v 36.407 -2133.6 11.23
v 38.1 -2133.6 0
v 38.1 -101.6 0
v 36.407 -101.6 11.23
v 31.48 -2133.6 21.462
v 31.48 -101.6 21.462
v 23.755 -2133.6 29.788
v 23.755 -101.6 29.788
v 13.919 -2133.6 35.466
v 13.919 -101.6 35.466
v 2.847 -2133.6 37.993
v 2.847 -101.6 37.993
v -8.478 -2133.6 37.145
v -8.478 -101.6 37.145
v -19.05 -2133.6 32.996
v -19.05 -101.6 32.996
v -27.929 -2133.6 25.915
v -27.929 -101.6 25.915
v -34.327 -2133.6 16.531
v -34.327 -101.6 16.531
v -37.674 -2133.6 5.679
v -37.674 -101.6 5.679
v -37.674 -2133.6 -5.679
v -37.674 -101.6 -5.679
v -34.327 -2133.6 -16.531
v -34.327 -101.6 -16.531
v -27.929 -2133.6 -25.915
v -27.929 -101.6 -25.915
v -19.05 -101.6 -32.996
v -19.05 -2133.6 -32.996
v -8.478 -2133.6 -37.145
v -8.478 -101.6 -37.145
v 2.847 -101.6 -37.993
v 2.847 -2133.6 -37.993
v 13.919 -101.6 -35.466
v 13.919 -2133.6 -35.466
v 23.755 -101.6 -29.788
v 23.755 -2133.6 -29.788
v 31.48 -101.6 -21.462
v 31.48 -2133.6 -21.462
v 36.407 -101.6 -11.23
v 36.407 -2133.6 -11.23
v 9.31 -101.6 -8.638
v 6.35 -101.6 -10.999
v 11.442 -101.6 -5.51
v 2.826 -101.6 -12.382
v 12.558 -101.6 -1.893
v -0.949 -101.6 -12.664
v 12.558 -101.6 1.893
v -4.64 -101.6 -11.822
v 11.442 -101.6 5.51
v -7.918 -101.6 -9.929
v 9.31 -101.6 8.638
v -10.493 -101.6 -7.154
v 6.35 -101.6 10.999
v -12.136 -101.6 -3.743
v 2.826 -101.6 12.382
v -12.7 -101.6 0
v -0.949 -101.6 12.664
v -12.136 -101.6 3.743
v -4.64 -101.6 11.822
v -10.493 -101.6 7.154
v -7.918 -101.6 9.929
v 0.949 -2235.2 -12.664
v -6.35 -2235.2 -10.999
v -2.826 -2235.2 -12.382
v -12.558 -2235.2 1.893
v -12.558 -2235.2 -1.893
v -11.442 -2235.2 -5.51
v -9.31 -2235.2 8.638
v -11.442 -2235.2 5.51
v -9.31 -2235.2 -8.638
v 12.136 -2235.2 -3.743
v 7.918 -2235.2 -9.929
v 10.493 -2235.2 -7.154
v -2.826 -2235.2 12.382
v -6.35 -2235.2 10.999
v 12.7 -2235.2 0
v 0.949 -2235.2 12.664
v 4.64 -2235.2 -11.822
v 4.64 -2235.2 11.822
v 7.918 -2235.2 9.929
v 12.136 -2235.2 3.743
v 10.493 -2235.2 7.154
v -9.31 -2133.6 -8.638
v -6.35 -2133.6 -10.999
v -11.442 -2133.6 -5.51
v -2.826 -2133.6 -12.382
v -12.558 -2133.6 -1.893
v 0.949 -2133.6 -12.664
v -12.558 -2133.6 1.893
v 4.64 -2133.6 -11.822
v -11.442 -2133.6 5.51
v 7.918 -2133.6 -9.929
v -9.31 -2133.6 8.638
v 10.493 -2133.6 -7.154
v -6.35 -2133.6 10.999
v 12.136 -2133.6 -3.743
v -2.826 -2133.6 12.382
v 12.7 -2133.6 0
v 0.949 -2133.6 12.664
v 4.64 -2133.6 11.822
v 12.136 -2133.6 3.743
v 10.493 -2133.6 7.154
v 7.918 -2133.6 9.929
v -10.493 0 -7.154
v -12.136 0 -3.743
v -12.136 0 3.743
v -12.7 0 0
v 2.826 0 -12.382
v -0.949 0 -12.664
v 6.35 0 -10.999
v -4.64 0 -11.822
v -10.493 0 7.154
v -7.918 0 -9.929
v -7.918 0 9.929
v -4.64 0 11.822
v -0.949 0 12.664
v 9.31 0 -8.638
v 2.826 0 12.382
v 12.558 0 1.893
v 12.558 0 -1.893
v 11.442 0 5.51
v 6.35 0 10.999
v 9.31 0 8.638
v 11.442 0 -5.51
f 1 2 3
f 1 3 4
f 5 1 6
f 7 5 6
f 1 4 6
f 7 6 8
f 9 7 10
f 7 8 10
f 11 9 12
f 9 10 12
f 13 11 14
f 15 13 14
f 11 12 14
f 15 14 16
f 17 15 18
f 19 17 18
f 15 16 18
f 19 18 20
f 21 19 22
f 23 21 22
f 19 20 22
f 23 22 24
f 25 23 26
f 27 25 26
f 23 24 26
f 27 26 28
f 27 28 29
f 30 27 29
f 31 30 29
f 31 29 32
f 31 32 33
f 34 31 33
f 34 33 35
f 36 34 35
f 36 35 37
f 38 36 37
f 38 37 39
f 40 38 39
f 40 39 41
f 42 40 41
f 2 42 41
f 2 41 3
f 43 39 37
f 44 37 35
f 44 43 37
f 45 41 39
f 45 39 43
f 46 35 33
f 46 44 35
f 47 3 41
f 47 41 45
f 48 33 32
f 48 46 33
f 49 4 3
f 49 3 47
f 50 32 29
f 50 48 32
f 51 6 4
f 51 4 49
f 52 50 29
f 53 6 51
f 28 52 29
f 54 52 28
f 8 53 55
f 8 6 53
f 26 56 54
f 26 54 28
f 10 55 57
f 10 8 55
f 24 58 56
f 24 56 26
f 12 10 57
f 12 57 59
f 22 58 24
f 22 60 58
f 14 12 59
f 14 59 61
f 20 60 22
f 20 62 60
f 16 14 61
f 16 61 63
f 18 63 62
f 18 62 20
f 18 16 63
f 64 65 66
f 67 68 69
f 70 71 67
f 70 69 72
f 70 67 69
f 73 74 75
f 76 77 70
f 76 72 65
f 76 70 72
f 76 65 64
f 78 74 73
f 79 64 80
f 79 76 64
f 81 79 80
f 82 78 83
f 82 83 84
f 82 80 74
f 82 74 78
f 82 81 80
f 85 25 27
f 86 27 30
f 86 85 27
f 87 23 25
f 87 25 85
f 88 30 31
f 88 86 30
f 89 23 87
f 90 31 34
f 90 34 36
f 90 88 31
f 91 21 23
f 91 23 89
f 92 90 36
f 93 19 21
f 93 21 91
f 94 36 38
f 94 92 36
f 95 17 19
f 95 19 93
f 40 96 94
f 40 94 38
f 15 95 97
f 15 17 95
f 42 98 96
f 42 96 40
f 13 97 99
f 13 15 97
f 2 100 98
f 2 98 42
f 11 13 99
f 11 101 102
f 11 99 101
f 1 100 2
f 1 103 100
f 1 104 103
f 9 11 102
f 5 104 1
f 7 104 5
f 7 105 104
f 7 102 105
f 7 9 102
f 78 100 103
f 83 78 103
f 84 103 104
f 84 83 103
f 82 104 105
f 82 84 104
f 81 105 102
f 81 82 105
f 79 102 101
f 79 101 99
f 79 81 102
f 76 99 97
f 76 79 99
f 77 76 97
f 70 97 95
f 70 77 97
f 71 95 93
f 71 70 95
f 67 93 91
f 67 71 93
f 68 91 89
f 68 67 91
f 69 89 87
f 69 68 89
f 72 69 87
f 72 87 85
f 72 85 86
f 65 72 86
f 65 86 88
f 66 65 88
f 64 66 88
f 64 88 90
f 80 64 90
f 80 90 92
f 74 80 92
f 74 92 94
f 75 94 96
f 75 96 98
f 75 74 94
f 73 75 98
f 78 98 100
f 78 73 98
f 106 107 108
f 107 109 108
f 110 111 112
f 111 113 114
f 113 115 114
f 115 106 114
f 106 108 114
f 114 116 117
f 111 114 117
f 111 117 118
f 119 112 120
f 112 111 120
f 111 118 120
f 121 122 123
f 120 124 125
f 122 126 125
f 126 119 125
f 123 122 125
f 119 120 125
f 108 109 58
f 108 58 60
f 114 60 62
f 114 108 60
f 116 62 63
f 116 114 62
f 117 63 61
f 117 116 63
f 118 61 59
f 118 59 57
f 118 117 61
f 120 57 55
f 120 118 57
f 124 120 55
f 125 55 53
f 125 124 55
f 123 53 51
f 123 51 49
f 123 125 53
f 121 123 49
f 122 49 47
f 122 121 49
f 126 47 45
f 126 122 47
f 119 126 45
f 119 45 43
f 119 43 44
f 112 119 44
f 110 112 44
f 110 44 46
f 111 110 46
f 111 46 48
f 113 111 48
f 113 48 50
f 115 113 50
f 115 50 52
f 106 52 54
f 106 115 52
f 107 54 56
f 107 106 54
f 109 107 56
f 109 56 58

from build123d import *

# Parameters (mm, degrees)
F0_R     = 38.1
F1_DEPTH = 2235.2
F2_R     = 38.1
F2_R_2   = 12.7
F3_DEPTH = 101.6
F4_R     = 38.1
F4_R_2   = 12.7
F5_DEPTH = 101.6


with BuildPart() as f1:
    # F0 (on Front) → F1 (new body)
    with BuildSketch(Plane.XZ):
        Circle(F0_R)
    extrude(amount=F1_DEPTH)

    # F2 (on face) → F3 (cut)
    with BuildSketch(Plane.XZ.offset(2235.2)):
        Circle(F2_R)
        Circle(F2_R_2, mode=Mode.SUBTRACT)
    extrude(amount=-F3_DEPTH, mode=Mode.SUBTRACT)

    # F4 (on face) → F5 (cut)
    with BuildSketch(Plane(origin=(0, 0, 0), x_dir=(-1, 0, 0), z_dir=(0, 1, 0))):
        Circle(F4_R)
        Circle(F4_R_2, mode=Mode.SUBTRACT)
    extrude(amount=-F5_DEPTH, mode=Mode.SUBTRACT)


solid = f1.part
